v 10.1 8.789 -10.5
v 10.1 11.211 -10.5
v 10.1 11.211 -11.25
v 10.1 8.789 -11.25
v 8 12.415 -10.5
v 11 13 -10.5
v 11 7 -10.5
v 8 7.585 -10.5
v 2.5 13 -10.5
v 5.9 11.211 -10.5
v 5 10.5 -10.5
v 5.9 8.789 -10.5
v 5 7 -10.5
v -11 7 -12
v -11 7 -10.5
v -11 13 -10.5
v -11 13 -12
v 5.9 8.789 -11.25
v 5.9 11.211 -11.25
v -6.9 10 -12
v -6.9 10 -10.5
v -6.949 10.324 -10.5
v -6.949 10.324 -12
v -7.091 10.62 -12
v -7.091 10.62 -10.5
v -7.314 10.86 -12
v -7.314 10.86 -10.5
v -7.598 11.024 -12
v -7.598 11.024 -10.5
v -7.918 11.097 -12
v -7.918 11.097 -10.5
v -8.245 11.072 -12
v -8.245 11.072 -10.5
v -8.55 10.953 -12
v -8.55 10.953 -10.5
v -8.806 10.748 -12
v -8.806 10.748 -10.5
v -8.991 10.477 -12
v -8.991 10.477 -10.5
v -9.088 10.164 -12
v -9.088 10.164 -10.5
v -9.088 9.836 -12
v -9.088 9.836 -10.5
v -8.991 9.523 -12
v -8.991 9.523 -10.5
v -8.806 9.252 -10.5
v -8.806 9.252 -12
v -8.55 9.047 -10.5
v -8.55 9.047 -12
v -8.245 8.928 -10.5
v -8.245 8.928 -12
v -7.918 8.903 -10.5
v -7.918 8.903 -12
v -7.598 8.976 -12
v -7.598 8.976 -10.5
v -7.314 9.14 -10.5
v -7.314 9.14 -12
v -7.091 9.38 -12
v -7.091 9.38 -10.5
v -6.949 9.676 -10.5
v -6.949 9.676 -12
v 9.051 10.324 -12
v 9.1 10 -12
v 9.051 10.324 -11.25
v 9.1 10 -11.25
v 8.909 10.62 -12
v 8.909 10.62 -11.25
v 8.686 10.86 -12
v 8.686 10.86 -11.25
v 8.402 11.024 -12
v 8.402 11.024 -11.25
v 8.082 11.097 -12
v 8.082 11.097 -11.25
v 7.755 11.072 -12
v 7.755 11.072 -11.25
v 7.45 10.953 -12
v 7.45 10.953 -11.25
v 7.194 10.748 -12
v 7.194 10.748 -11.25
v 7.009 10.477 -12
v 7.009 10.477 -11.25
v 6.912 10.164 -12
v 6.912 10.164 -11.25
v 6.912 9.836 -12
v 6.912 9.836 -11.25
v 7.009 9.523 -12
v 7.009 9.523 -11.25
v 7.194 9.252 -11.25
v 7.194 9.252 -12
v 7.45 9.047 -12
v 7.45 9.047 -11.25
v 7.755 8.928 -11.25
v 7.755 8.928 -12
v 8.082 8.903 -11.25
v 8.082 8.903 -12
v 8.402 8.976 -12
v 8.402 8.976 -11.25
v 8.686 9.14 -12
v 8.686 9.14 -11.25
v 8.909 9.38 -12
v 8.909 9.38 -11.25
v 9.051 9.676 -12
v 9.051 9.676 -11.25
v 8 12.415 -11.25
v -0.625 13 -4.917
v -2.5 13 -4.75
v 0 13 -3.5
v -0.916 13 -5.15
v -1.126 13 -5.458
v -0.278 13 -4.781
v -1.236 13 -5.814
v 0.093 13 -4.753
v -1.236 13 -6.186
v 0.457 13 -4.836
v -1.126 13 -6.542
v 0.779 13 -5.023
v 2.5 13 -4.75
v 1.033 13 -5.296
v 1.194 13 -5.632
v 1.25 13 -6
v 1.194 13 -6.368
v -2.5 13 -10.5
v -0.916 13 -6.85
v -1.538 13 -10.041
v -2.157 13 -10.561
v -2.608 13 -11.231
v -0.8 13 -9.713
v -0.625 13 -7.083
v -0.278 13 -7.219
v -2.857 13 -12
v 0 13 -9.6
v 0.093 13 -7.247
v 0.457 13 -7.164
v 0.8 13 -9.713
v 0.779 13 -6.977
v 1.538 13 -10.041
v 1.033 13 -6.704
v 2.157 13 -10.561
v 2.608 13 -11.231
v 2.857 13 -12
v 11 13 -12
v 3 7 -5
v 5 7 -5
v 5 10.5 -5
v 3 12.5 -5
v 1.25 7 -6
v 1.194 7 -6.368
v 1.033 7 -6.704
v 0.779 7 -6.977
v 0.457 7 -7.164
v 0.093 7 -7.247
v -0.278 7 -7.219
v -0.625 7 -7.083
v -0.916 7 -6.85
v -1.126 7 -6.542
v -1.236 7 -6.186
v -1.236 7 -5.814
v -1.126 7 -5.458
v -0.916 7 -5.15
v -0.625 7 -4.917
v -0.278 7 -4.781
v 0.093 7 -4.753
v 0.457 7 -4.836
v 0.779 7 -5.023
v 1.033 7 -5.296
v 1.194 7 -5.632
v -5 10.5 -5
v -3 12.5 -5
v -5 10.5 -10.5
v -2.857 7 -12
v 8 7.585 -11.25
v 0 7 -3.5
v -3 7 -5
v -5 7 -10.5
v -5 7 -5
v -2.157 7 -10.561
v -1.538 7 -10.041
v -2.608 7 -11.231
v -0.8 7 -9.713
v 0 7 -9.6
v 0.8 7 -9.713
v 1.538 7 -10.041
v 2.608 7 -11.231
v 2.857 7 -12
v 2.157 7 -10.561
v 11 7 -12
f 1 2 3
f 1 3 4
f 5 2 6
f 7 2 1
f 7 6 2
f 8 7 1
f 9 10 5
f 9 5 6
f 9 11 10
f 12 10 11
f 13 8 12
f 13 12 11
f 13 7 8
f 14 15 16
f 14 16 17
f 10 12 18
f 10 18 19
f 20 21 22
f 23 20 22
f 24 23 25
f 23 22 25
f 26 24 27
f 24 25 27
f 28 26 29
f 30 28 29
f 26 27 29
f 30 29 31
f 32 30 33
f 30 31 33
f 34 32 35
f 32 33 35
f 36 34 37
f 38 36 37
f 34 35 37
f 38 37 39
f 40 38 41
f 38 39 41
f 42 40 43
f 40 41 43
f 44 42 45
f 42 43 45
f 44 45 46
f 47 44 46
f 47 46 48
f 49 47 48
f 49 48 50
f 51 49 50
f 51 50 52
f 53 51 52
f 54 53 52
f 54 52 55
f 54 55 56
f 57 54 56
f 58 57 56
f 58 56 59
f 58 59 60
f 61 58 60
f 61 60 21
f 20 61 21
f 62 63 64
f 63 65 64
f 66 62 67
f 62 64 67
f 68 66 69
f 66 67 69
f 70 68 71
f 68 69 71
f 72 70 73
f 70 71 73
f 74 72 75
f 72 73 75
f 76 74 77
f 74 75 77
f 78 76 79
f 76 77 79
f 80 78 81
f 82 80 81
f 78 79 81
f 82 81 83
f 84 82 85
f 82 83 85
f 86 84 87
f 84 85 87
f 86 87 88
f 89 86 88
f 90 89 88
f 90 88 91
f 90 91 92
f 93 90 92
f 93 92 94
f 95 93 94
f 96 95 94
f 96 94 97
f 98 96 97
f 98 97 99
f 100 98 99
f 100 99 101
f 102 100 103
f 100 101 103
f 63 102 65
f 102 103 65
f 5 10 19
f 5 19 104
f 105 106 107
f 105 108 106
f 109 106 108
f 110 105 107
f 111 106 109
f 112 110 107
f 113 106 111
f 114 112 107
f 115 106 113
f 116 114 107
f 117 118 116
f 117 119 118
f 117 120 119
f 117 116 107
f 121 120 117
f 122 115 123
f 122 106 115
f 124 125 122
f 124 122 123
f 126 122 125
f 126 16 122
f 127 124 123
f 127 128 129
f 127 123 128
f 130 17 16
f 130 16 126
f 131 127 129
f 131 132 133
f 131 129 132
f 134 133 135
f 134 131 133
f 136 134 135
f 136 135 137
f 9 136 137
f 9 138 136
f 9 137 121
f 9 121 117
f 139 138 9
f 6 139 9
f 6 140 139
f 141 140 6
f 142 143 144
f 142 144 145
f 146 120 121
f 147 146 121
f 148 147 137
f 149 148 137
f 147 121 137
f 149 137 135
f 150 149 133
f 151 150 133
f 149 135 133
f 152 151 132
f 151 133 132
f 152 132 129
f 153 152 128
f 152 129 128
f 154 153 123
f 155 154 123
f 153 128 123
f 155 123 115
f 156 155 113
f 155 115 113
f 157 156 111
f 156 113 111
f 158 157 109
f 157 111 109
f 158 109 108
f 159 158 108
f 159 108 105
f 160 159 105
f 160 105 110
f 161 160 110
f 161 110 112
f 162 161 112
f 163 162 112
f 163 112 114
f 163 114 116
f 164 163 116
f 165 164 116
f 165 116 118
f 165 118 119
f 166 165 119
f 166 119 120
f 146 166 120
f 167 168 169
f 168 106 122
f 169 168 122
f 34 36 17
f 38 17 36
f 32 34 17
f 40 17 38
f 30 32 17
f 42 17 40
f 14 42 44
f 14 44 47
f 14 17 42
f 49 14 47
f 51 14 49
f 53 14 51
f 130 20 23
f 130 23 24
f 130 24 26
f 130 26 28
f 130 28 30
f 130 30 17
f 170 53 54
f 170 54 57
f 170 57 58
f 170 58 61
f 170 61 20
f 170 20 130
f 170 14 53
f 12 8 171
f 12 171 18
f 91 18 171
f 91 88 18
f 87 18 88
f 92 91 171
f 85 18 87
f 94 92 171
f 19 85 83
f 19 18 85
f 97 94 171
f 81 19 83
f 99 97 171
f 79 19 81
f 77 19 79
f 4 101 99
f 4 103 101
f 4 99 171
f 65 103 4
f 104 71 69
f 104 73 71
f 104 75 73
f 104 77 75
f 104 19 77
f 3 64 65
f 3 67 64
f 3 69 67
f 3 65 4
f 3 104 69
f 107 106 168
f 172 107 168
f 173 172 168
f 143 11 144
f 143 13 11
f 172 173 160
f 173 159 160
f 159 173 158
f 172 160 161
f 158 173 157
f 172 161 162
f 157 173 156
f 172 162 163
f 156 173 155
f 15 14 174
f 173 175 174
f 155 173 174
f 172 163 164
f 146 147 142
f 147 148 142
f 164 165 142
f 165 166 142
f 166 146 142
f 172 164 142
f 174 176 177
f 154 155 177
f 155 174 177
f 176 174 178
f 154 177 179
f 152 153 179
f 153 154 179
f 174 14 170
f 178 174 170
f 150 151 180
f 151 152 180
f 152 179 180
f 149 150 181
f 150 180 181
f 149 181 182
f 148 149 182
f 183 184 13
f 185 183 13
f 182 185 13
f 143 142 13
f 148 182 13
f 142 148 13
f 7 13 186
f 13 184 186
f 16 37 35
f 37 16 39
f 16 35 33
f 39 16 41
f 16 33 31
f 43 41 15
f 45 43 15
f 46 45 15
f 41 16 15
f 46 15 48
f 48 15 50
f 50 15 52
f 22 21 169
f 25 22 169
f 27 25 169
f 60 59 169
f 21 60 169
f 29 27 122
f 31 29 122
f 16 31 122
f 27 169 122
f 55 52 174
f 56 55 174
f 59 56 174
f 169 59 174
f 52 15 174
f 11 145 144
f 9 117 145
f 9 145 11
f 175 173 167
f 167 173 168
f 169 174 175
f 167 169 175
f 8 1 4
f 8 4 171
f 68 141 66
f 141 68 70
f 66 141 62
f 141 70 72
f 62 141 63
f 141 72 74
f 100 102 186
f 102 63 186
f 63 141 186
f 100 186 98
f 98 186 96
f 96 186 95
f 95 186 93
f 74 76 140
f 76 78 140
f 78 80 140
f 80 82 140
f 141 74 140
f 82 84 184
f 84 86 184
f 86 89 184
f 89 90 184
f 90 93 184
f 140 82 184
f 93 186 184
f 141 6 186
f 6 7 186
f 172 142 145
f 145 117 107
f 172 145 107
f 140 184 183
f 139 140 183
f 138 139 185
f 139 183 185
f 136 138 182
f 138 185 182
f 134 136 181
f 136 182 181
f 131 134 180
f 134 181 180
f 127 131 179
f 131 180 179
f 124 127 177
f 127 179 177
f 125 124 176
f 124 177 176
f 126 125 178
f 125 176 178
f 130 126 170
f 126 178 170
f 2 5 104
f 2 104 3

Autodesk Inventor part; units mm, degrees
ref_plane "YZ Plane" through (0, 0, 0) normal (1, 0, 0) x (0, 1, 0)
ref_plane "XZ Plane" through (0, 0, 0) normal (0, 1, 0) x (-1, 0, 0)
ref_plane "XY Plane" through (0, 0, 0) normal (0, 0, 1) x (1, 0, 0)
sketch "スケッチ1" plane through (0, 0, 0) normal (0, 1, 0) x (-1, 0, 0)
  line L0 (15, 2.5) -> (-15, 2.5)
  line L1 (-15, 2.5) -> (-15, -2.5)
  line L2 (-15, -2.5) -> (15, -2.5)
  line L3 (15, -2.5) -> (15, 2.5)
  line L4 (15, 2.5) -> (-15, -2.5) construction
  line L5 (-15, 2.5) -> (15, -2.5) construction
  point P0 (0, 0)
  dimension "d0" = 30
  dimension "d1" = 5
extrude "押し出し1" add sketch "スケッチ1" along normal blind 7
sketch "スケッチ2" plane through (0, 7, 0) normal (0, 1, 0) x (1, 0, 0)
  circle A0 centre (0, 12.5) radius 2.9
  circle A1 centre (0, 12.5) radius 5.3852
  line L0 (-11, 10.5) -> (-5, 10.5)
  line L1 (-5, 10.5) -> (-5, 2.5)
  line L2 (15, 2.5) -> (-15, 2.5) projected
  line L3 (0, -8.1348) -> (0, 42.7212)
  line L4 (-15, -2.5) -> (15, -2.5) projected
  line L5 (15, -2.5) -> (15, 2.5) projected
  line L6 (15, 2.5) -> (-15, 2.5) projected
  line L7 (-15, 2.5) -> (-15, -2.5) projected
  line L8 (-15, -2.5) -> (15, -2.5) projected
  line L9 (-11, 10.5) -> (-11, 12)
  line L10 (-11, 12) -> (0, 12)
  line L11 (11, 10.5) -> (5, 10.5)
  line L12 (5, 10.5) -> (5, 2.5)
  line L13 (11, 10.5) -> (11, 12)
  line L14 (11, 12) -> (0, 12)
  point P0 (0, 0)
  point P1 (2.8566, 12)
  point P2 (-2.8566, 12)
  dimension "d5" = 5.8
  dimension "d9" = 6
  dimension "d10" = 10
  dimension "d40" = 0.5
  dimension "d41" = 15
  dimension "d42" = 1.5
extrude "押し出し2" add sketch "スケッチ2" along normal blind 6 contours L14 A1 L3 A0 | A0 L3 A1 L10 | L14 L13 L11 A1 | A1 L0 L9 L10 | L3 L2 L1 A1 | A1 L12 L2 L3 | L3 L4 L7 L2 | L2 L5 L4 L3 picked at (0.6464, 8.0199) picked at (-0.6464, 8.0199)
sketch "スケッチ4" plane through (0, 0, 0) normal (0, -1, 0) x (1, 0, 0)
  line L0 (-15, 2.5) -> (15, 2.5) projected
  line L1 (-15, -2.5) -> (-15, 2.5) projected
  line L2 (-15, 2.5) -> (15, 2.5) projected
  circle A0 centre (-12.5, 0) radius 1.6
  line L3 (0, 2.5) -> (0, -2.5)
  circle A1 centre (12.5, 0) radius 1.6
  point P0 (0, 0)
  point P1 (-15, 0)
  dimension "d78" = 3.2
  dimension "d79" = 2.5
extrude "押し出し4" cut sketch "スケッチ4" against normal blind 5
sketch "スケッチ5" plane through (-11, 7, -10.5) normal (0, 0, 1) x (1, 0, 0)
  circle A0 centre (3, 3) radius 1.1
  circle A1 centre (19, 3) radius 1.1
  line L0 (0, 6) -> (6, 6) projected
  line L1 (0, 0) -> (0, 6) projected
  line L2 (19, 5.3) -> (17, 4.1528)
  line L3 (17, 4.1528) -> (17, 1.8472)
  line L4 (17, 1.8472) -> (19, 0.7)
  line L5 (19, 0.7) -> (21, 1.8472)
  line L6 (21, 1.8472) -> (21, 4.1528)
  line L7 (21, 4.1528) -> (19, 5.3)
  line L8 (17, 1.8472) -> (21, 4.1528)
  line L9 (17, 4.1528) -> (21, 1.8472)
  line L10 (19, 5.3) -> (19, 0.7)
  line L11 (16.9, 4.2107) -> (19, 5.4153)
  line L12 (19, 5.4153) -> (21.1, 4.2107)
  line L13 (21.1, 4.2107) -> (21.1, 1.7893)
  line L14 (21.1, 1.7893) -> (19, 0.5847)
  line L15 (19, 0.5847) -> (16.9, 1.7893)
  line L16 (16.9, 1.7893) -> (16.9, 4.2107)
  line L17 (16, 6) -> (22, 6) projected
  line L18 (22, 0) -> (22, 6) projected
  point P0 (11, -7)
  point P1 (3, 6)
  point P2 (0, 3)
  point P3 (19, 6)
  point P4 (22, 3)
  dimension "d0" = 30
  dimension "d1" = 5
  dimension "d27" = 2.2
  dimension "d28" = 2.2
  dimension "d29" = 4.6
  dimension "d31" = 4
  dimension "d35" = 0.1
extrude "押し出し5" cut sketch "スケッチ5" against normal blind 0.75 contours A1 L9 L8 | A1 L8 L6 L9 | L8 L10 A1 | A1 L10 L7 L8 | L9 L5 L10 A1 | A1 L10 L9 | L10 L9 A1 | A1 L9 L2 L10 | L10 A1 L8 | L8 A1 L9 | L10 L4 L8 A1 | A1 L8 L3 L9 | L11 L12 L13 L14 L15 L16
extrude "押し出し6" cut sketch "スケッチ5" against normal through all contours A0
extrude "押し出し7" cut sketch "スケッチ5" against normal through all contours A1 L9 L8 | L8 L10 A1 | A1 L10 L9 | L10 L9 A1 | L10 A1 L8 | L8 A1 L9
sketch "スケッチ7" plane through (15, 0, -2.5) normal (0, 0, -1) x (-1, 0, 0)
  line L0 (10, 7.5) -> (0, 7.5)
  line L1 (0, 0) -> (0, 13) projected
  line L2 (10, 13) -> (10, 7.5)
  circle A0 centre (7, 10) radius 1.1 projected
  line L3 (4, 7) -> (12.1434, 7) projected
  line L4 (12.1434, 7) -> (12.1434, 13) projected
  line L5 (4, 13) -> (12.1434, 13) projected
  line L6 (4, 7) -> (4, 13) projected
  line L7 (0, 0) -> (30, 0) projected
  line L8 (30, 0) -> (30, 13) projected
  line L9 (20, 13) -> (30, 13) projected
  line L10 (20, 7) -> (20, 13) projected
  line L11 (10, 7) -> (20, 7) projected
  line L12 (10, 7) -> (10, 13) projected
  line L13 (0, 13) -> (10, 13) projected
  line L14 (0, 0) -> (0, 13) projected
  line L15 (15, 13) -> (15, 0)
  line L16 (20, 7.5) -> (30, 7.5)
  line L17 (20, 13) -> (20, 7.5)
  dimension "d53" = 0.5
extrude "押し出し8" cut sketch "スケッチ7" against normal through all contours L0 L6 L5 L2 | L0 L1 L13 L6 | L10 L9 L8 L16 | A0
chamfer "面取り6" distance 3 angle 45 2 edges at (5, 7.5, 0) (-5, 7.5, 0)
chamfer "面取り7" distance 2 angle 45 2 edges at (15, 7.5, 0) (-15, 7.5, 0)
chamfer "面取り8" distance 2.5 angle 45 2 edges at (5, 13, -4) (-5, 13, -4)
chamfer "面取り9" distance 2 angle 45 11 edges at (-10.5, 7.5, 2.5) (-6.5, 9, 2.5) (0, 13, 2.5) (6.5, 9, 2.5) (10.5, 7.5, 2.5) (-14, 6.5, -2.5) (-10.5, 7.5, -2.5) (-6.5, 9, -2.5) (6.5, 9, -2.5) (10.5, 7.5, -2.5) (14, 6.5, -2.5)
sketch "スケッチ9" plane through (0, 13, 0) normal (0, 1, 0) x (1, 0, 0)
  circle A0 centre (0, 6) radius 1.25
  point P0 (0, 0)
  dimension "d74" = 2.5
  dimension "d75" = 6
extrude "押し出し9" cut sketch "スケッチ9" against normal through all
sketch "スケッチ10" plane through (0, 7, 0) normal (0, -1, 0) x (1, 0, 0)
  line L0 (5, -2.5) -> (5, -10.5) projected
  line L1 (5, -5) -> (3, -5)
  line L2 (3, -5) -> (0, -3.5)
  line L3 (0, -3.5) -> (-3, -5)
  line L4 (-3, -5) -> (-5, -5)
  line L5 (15, -2.5) -> (-15, -2.5) projected
  line L6 (-5, -10.5) -> (-5, -2.5) projected
  point P0 (0, 0)
  dimension "d80" = 2.5
  dimension "d81" = 1.5
  dimension "d82" = 2
split body "分割2" sketch "スケッチ10" result one side removed curves L1 L2 L3 L4 removed pieces at (2.3905, 1.8333, 2)
properties part number "mounter_top"
